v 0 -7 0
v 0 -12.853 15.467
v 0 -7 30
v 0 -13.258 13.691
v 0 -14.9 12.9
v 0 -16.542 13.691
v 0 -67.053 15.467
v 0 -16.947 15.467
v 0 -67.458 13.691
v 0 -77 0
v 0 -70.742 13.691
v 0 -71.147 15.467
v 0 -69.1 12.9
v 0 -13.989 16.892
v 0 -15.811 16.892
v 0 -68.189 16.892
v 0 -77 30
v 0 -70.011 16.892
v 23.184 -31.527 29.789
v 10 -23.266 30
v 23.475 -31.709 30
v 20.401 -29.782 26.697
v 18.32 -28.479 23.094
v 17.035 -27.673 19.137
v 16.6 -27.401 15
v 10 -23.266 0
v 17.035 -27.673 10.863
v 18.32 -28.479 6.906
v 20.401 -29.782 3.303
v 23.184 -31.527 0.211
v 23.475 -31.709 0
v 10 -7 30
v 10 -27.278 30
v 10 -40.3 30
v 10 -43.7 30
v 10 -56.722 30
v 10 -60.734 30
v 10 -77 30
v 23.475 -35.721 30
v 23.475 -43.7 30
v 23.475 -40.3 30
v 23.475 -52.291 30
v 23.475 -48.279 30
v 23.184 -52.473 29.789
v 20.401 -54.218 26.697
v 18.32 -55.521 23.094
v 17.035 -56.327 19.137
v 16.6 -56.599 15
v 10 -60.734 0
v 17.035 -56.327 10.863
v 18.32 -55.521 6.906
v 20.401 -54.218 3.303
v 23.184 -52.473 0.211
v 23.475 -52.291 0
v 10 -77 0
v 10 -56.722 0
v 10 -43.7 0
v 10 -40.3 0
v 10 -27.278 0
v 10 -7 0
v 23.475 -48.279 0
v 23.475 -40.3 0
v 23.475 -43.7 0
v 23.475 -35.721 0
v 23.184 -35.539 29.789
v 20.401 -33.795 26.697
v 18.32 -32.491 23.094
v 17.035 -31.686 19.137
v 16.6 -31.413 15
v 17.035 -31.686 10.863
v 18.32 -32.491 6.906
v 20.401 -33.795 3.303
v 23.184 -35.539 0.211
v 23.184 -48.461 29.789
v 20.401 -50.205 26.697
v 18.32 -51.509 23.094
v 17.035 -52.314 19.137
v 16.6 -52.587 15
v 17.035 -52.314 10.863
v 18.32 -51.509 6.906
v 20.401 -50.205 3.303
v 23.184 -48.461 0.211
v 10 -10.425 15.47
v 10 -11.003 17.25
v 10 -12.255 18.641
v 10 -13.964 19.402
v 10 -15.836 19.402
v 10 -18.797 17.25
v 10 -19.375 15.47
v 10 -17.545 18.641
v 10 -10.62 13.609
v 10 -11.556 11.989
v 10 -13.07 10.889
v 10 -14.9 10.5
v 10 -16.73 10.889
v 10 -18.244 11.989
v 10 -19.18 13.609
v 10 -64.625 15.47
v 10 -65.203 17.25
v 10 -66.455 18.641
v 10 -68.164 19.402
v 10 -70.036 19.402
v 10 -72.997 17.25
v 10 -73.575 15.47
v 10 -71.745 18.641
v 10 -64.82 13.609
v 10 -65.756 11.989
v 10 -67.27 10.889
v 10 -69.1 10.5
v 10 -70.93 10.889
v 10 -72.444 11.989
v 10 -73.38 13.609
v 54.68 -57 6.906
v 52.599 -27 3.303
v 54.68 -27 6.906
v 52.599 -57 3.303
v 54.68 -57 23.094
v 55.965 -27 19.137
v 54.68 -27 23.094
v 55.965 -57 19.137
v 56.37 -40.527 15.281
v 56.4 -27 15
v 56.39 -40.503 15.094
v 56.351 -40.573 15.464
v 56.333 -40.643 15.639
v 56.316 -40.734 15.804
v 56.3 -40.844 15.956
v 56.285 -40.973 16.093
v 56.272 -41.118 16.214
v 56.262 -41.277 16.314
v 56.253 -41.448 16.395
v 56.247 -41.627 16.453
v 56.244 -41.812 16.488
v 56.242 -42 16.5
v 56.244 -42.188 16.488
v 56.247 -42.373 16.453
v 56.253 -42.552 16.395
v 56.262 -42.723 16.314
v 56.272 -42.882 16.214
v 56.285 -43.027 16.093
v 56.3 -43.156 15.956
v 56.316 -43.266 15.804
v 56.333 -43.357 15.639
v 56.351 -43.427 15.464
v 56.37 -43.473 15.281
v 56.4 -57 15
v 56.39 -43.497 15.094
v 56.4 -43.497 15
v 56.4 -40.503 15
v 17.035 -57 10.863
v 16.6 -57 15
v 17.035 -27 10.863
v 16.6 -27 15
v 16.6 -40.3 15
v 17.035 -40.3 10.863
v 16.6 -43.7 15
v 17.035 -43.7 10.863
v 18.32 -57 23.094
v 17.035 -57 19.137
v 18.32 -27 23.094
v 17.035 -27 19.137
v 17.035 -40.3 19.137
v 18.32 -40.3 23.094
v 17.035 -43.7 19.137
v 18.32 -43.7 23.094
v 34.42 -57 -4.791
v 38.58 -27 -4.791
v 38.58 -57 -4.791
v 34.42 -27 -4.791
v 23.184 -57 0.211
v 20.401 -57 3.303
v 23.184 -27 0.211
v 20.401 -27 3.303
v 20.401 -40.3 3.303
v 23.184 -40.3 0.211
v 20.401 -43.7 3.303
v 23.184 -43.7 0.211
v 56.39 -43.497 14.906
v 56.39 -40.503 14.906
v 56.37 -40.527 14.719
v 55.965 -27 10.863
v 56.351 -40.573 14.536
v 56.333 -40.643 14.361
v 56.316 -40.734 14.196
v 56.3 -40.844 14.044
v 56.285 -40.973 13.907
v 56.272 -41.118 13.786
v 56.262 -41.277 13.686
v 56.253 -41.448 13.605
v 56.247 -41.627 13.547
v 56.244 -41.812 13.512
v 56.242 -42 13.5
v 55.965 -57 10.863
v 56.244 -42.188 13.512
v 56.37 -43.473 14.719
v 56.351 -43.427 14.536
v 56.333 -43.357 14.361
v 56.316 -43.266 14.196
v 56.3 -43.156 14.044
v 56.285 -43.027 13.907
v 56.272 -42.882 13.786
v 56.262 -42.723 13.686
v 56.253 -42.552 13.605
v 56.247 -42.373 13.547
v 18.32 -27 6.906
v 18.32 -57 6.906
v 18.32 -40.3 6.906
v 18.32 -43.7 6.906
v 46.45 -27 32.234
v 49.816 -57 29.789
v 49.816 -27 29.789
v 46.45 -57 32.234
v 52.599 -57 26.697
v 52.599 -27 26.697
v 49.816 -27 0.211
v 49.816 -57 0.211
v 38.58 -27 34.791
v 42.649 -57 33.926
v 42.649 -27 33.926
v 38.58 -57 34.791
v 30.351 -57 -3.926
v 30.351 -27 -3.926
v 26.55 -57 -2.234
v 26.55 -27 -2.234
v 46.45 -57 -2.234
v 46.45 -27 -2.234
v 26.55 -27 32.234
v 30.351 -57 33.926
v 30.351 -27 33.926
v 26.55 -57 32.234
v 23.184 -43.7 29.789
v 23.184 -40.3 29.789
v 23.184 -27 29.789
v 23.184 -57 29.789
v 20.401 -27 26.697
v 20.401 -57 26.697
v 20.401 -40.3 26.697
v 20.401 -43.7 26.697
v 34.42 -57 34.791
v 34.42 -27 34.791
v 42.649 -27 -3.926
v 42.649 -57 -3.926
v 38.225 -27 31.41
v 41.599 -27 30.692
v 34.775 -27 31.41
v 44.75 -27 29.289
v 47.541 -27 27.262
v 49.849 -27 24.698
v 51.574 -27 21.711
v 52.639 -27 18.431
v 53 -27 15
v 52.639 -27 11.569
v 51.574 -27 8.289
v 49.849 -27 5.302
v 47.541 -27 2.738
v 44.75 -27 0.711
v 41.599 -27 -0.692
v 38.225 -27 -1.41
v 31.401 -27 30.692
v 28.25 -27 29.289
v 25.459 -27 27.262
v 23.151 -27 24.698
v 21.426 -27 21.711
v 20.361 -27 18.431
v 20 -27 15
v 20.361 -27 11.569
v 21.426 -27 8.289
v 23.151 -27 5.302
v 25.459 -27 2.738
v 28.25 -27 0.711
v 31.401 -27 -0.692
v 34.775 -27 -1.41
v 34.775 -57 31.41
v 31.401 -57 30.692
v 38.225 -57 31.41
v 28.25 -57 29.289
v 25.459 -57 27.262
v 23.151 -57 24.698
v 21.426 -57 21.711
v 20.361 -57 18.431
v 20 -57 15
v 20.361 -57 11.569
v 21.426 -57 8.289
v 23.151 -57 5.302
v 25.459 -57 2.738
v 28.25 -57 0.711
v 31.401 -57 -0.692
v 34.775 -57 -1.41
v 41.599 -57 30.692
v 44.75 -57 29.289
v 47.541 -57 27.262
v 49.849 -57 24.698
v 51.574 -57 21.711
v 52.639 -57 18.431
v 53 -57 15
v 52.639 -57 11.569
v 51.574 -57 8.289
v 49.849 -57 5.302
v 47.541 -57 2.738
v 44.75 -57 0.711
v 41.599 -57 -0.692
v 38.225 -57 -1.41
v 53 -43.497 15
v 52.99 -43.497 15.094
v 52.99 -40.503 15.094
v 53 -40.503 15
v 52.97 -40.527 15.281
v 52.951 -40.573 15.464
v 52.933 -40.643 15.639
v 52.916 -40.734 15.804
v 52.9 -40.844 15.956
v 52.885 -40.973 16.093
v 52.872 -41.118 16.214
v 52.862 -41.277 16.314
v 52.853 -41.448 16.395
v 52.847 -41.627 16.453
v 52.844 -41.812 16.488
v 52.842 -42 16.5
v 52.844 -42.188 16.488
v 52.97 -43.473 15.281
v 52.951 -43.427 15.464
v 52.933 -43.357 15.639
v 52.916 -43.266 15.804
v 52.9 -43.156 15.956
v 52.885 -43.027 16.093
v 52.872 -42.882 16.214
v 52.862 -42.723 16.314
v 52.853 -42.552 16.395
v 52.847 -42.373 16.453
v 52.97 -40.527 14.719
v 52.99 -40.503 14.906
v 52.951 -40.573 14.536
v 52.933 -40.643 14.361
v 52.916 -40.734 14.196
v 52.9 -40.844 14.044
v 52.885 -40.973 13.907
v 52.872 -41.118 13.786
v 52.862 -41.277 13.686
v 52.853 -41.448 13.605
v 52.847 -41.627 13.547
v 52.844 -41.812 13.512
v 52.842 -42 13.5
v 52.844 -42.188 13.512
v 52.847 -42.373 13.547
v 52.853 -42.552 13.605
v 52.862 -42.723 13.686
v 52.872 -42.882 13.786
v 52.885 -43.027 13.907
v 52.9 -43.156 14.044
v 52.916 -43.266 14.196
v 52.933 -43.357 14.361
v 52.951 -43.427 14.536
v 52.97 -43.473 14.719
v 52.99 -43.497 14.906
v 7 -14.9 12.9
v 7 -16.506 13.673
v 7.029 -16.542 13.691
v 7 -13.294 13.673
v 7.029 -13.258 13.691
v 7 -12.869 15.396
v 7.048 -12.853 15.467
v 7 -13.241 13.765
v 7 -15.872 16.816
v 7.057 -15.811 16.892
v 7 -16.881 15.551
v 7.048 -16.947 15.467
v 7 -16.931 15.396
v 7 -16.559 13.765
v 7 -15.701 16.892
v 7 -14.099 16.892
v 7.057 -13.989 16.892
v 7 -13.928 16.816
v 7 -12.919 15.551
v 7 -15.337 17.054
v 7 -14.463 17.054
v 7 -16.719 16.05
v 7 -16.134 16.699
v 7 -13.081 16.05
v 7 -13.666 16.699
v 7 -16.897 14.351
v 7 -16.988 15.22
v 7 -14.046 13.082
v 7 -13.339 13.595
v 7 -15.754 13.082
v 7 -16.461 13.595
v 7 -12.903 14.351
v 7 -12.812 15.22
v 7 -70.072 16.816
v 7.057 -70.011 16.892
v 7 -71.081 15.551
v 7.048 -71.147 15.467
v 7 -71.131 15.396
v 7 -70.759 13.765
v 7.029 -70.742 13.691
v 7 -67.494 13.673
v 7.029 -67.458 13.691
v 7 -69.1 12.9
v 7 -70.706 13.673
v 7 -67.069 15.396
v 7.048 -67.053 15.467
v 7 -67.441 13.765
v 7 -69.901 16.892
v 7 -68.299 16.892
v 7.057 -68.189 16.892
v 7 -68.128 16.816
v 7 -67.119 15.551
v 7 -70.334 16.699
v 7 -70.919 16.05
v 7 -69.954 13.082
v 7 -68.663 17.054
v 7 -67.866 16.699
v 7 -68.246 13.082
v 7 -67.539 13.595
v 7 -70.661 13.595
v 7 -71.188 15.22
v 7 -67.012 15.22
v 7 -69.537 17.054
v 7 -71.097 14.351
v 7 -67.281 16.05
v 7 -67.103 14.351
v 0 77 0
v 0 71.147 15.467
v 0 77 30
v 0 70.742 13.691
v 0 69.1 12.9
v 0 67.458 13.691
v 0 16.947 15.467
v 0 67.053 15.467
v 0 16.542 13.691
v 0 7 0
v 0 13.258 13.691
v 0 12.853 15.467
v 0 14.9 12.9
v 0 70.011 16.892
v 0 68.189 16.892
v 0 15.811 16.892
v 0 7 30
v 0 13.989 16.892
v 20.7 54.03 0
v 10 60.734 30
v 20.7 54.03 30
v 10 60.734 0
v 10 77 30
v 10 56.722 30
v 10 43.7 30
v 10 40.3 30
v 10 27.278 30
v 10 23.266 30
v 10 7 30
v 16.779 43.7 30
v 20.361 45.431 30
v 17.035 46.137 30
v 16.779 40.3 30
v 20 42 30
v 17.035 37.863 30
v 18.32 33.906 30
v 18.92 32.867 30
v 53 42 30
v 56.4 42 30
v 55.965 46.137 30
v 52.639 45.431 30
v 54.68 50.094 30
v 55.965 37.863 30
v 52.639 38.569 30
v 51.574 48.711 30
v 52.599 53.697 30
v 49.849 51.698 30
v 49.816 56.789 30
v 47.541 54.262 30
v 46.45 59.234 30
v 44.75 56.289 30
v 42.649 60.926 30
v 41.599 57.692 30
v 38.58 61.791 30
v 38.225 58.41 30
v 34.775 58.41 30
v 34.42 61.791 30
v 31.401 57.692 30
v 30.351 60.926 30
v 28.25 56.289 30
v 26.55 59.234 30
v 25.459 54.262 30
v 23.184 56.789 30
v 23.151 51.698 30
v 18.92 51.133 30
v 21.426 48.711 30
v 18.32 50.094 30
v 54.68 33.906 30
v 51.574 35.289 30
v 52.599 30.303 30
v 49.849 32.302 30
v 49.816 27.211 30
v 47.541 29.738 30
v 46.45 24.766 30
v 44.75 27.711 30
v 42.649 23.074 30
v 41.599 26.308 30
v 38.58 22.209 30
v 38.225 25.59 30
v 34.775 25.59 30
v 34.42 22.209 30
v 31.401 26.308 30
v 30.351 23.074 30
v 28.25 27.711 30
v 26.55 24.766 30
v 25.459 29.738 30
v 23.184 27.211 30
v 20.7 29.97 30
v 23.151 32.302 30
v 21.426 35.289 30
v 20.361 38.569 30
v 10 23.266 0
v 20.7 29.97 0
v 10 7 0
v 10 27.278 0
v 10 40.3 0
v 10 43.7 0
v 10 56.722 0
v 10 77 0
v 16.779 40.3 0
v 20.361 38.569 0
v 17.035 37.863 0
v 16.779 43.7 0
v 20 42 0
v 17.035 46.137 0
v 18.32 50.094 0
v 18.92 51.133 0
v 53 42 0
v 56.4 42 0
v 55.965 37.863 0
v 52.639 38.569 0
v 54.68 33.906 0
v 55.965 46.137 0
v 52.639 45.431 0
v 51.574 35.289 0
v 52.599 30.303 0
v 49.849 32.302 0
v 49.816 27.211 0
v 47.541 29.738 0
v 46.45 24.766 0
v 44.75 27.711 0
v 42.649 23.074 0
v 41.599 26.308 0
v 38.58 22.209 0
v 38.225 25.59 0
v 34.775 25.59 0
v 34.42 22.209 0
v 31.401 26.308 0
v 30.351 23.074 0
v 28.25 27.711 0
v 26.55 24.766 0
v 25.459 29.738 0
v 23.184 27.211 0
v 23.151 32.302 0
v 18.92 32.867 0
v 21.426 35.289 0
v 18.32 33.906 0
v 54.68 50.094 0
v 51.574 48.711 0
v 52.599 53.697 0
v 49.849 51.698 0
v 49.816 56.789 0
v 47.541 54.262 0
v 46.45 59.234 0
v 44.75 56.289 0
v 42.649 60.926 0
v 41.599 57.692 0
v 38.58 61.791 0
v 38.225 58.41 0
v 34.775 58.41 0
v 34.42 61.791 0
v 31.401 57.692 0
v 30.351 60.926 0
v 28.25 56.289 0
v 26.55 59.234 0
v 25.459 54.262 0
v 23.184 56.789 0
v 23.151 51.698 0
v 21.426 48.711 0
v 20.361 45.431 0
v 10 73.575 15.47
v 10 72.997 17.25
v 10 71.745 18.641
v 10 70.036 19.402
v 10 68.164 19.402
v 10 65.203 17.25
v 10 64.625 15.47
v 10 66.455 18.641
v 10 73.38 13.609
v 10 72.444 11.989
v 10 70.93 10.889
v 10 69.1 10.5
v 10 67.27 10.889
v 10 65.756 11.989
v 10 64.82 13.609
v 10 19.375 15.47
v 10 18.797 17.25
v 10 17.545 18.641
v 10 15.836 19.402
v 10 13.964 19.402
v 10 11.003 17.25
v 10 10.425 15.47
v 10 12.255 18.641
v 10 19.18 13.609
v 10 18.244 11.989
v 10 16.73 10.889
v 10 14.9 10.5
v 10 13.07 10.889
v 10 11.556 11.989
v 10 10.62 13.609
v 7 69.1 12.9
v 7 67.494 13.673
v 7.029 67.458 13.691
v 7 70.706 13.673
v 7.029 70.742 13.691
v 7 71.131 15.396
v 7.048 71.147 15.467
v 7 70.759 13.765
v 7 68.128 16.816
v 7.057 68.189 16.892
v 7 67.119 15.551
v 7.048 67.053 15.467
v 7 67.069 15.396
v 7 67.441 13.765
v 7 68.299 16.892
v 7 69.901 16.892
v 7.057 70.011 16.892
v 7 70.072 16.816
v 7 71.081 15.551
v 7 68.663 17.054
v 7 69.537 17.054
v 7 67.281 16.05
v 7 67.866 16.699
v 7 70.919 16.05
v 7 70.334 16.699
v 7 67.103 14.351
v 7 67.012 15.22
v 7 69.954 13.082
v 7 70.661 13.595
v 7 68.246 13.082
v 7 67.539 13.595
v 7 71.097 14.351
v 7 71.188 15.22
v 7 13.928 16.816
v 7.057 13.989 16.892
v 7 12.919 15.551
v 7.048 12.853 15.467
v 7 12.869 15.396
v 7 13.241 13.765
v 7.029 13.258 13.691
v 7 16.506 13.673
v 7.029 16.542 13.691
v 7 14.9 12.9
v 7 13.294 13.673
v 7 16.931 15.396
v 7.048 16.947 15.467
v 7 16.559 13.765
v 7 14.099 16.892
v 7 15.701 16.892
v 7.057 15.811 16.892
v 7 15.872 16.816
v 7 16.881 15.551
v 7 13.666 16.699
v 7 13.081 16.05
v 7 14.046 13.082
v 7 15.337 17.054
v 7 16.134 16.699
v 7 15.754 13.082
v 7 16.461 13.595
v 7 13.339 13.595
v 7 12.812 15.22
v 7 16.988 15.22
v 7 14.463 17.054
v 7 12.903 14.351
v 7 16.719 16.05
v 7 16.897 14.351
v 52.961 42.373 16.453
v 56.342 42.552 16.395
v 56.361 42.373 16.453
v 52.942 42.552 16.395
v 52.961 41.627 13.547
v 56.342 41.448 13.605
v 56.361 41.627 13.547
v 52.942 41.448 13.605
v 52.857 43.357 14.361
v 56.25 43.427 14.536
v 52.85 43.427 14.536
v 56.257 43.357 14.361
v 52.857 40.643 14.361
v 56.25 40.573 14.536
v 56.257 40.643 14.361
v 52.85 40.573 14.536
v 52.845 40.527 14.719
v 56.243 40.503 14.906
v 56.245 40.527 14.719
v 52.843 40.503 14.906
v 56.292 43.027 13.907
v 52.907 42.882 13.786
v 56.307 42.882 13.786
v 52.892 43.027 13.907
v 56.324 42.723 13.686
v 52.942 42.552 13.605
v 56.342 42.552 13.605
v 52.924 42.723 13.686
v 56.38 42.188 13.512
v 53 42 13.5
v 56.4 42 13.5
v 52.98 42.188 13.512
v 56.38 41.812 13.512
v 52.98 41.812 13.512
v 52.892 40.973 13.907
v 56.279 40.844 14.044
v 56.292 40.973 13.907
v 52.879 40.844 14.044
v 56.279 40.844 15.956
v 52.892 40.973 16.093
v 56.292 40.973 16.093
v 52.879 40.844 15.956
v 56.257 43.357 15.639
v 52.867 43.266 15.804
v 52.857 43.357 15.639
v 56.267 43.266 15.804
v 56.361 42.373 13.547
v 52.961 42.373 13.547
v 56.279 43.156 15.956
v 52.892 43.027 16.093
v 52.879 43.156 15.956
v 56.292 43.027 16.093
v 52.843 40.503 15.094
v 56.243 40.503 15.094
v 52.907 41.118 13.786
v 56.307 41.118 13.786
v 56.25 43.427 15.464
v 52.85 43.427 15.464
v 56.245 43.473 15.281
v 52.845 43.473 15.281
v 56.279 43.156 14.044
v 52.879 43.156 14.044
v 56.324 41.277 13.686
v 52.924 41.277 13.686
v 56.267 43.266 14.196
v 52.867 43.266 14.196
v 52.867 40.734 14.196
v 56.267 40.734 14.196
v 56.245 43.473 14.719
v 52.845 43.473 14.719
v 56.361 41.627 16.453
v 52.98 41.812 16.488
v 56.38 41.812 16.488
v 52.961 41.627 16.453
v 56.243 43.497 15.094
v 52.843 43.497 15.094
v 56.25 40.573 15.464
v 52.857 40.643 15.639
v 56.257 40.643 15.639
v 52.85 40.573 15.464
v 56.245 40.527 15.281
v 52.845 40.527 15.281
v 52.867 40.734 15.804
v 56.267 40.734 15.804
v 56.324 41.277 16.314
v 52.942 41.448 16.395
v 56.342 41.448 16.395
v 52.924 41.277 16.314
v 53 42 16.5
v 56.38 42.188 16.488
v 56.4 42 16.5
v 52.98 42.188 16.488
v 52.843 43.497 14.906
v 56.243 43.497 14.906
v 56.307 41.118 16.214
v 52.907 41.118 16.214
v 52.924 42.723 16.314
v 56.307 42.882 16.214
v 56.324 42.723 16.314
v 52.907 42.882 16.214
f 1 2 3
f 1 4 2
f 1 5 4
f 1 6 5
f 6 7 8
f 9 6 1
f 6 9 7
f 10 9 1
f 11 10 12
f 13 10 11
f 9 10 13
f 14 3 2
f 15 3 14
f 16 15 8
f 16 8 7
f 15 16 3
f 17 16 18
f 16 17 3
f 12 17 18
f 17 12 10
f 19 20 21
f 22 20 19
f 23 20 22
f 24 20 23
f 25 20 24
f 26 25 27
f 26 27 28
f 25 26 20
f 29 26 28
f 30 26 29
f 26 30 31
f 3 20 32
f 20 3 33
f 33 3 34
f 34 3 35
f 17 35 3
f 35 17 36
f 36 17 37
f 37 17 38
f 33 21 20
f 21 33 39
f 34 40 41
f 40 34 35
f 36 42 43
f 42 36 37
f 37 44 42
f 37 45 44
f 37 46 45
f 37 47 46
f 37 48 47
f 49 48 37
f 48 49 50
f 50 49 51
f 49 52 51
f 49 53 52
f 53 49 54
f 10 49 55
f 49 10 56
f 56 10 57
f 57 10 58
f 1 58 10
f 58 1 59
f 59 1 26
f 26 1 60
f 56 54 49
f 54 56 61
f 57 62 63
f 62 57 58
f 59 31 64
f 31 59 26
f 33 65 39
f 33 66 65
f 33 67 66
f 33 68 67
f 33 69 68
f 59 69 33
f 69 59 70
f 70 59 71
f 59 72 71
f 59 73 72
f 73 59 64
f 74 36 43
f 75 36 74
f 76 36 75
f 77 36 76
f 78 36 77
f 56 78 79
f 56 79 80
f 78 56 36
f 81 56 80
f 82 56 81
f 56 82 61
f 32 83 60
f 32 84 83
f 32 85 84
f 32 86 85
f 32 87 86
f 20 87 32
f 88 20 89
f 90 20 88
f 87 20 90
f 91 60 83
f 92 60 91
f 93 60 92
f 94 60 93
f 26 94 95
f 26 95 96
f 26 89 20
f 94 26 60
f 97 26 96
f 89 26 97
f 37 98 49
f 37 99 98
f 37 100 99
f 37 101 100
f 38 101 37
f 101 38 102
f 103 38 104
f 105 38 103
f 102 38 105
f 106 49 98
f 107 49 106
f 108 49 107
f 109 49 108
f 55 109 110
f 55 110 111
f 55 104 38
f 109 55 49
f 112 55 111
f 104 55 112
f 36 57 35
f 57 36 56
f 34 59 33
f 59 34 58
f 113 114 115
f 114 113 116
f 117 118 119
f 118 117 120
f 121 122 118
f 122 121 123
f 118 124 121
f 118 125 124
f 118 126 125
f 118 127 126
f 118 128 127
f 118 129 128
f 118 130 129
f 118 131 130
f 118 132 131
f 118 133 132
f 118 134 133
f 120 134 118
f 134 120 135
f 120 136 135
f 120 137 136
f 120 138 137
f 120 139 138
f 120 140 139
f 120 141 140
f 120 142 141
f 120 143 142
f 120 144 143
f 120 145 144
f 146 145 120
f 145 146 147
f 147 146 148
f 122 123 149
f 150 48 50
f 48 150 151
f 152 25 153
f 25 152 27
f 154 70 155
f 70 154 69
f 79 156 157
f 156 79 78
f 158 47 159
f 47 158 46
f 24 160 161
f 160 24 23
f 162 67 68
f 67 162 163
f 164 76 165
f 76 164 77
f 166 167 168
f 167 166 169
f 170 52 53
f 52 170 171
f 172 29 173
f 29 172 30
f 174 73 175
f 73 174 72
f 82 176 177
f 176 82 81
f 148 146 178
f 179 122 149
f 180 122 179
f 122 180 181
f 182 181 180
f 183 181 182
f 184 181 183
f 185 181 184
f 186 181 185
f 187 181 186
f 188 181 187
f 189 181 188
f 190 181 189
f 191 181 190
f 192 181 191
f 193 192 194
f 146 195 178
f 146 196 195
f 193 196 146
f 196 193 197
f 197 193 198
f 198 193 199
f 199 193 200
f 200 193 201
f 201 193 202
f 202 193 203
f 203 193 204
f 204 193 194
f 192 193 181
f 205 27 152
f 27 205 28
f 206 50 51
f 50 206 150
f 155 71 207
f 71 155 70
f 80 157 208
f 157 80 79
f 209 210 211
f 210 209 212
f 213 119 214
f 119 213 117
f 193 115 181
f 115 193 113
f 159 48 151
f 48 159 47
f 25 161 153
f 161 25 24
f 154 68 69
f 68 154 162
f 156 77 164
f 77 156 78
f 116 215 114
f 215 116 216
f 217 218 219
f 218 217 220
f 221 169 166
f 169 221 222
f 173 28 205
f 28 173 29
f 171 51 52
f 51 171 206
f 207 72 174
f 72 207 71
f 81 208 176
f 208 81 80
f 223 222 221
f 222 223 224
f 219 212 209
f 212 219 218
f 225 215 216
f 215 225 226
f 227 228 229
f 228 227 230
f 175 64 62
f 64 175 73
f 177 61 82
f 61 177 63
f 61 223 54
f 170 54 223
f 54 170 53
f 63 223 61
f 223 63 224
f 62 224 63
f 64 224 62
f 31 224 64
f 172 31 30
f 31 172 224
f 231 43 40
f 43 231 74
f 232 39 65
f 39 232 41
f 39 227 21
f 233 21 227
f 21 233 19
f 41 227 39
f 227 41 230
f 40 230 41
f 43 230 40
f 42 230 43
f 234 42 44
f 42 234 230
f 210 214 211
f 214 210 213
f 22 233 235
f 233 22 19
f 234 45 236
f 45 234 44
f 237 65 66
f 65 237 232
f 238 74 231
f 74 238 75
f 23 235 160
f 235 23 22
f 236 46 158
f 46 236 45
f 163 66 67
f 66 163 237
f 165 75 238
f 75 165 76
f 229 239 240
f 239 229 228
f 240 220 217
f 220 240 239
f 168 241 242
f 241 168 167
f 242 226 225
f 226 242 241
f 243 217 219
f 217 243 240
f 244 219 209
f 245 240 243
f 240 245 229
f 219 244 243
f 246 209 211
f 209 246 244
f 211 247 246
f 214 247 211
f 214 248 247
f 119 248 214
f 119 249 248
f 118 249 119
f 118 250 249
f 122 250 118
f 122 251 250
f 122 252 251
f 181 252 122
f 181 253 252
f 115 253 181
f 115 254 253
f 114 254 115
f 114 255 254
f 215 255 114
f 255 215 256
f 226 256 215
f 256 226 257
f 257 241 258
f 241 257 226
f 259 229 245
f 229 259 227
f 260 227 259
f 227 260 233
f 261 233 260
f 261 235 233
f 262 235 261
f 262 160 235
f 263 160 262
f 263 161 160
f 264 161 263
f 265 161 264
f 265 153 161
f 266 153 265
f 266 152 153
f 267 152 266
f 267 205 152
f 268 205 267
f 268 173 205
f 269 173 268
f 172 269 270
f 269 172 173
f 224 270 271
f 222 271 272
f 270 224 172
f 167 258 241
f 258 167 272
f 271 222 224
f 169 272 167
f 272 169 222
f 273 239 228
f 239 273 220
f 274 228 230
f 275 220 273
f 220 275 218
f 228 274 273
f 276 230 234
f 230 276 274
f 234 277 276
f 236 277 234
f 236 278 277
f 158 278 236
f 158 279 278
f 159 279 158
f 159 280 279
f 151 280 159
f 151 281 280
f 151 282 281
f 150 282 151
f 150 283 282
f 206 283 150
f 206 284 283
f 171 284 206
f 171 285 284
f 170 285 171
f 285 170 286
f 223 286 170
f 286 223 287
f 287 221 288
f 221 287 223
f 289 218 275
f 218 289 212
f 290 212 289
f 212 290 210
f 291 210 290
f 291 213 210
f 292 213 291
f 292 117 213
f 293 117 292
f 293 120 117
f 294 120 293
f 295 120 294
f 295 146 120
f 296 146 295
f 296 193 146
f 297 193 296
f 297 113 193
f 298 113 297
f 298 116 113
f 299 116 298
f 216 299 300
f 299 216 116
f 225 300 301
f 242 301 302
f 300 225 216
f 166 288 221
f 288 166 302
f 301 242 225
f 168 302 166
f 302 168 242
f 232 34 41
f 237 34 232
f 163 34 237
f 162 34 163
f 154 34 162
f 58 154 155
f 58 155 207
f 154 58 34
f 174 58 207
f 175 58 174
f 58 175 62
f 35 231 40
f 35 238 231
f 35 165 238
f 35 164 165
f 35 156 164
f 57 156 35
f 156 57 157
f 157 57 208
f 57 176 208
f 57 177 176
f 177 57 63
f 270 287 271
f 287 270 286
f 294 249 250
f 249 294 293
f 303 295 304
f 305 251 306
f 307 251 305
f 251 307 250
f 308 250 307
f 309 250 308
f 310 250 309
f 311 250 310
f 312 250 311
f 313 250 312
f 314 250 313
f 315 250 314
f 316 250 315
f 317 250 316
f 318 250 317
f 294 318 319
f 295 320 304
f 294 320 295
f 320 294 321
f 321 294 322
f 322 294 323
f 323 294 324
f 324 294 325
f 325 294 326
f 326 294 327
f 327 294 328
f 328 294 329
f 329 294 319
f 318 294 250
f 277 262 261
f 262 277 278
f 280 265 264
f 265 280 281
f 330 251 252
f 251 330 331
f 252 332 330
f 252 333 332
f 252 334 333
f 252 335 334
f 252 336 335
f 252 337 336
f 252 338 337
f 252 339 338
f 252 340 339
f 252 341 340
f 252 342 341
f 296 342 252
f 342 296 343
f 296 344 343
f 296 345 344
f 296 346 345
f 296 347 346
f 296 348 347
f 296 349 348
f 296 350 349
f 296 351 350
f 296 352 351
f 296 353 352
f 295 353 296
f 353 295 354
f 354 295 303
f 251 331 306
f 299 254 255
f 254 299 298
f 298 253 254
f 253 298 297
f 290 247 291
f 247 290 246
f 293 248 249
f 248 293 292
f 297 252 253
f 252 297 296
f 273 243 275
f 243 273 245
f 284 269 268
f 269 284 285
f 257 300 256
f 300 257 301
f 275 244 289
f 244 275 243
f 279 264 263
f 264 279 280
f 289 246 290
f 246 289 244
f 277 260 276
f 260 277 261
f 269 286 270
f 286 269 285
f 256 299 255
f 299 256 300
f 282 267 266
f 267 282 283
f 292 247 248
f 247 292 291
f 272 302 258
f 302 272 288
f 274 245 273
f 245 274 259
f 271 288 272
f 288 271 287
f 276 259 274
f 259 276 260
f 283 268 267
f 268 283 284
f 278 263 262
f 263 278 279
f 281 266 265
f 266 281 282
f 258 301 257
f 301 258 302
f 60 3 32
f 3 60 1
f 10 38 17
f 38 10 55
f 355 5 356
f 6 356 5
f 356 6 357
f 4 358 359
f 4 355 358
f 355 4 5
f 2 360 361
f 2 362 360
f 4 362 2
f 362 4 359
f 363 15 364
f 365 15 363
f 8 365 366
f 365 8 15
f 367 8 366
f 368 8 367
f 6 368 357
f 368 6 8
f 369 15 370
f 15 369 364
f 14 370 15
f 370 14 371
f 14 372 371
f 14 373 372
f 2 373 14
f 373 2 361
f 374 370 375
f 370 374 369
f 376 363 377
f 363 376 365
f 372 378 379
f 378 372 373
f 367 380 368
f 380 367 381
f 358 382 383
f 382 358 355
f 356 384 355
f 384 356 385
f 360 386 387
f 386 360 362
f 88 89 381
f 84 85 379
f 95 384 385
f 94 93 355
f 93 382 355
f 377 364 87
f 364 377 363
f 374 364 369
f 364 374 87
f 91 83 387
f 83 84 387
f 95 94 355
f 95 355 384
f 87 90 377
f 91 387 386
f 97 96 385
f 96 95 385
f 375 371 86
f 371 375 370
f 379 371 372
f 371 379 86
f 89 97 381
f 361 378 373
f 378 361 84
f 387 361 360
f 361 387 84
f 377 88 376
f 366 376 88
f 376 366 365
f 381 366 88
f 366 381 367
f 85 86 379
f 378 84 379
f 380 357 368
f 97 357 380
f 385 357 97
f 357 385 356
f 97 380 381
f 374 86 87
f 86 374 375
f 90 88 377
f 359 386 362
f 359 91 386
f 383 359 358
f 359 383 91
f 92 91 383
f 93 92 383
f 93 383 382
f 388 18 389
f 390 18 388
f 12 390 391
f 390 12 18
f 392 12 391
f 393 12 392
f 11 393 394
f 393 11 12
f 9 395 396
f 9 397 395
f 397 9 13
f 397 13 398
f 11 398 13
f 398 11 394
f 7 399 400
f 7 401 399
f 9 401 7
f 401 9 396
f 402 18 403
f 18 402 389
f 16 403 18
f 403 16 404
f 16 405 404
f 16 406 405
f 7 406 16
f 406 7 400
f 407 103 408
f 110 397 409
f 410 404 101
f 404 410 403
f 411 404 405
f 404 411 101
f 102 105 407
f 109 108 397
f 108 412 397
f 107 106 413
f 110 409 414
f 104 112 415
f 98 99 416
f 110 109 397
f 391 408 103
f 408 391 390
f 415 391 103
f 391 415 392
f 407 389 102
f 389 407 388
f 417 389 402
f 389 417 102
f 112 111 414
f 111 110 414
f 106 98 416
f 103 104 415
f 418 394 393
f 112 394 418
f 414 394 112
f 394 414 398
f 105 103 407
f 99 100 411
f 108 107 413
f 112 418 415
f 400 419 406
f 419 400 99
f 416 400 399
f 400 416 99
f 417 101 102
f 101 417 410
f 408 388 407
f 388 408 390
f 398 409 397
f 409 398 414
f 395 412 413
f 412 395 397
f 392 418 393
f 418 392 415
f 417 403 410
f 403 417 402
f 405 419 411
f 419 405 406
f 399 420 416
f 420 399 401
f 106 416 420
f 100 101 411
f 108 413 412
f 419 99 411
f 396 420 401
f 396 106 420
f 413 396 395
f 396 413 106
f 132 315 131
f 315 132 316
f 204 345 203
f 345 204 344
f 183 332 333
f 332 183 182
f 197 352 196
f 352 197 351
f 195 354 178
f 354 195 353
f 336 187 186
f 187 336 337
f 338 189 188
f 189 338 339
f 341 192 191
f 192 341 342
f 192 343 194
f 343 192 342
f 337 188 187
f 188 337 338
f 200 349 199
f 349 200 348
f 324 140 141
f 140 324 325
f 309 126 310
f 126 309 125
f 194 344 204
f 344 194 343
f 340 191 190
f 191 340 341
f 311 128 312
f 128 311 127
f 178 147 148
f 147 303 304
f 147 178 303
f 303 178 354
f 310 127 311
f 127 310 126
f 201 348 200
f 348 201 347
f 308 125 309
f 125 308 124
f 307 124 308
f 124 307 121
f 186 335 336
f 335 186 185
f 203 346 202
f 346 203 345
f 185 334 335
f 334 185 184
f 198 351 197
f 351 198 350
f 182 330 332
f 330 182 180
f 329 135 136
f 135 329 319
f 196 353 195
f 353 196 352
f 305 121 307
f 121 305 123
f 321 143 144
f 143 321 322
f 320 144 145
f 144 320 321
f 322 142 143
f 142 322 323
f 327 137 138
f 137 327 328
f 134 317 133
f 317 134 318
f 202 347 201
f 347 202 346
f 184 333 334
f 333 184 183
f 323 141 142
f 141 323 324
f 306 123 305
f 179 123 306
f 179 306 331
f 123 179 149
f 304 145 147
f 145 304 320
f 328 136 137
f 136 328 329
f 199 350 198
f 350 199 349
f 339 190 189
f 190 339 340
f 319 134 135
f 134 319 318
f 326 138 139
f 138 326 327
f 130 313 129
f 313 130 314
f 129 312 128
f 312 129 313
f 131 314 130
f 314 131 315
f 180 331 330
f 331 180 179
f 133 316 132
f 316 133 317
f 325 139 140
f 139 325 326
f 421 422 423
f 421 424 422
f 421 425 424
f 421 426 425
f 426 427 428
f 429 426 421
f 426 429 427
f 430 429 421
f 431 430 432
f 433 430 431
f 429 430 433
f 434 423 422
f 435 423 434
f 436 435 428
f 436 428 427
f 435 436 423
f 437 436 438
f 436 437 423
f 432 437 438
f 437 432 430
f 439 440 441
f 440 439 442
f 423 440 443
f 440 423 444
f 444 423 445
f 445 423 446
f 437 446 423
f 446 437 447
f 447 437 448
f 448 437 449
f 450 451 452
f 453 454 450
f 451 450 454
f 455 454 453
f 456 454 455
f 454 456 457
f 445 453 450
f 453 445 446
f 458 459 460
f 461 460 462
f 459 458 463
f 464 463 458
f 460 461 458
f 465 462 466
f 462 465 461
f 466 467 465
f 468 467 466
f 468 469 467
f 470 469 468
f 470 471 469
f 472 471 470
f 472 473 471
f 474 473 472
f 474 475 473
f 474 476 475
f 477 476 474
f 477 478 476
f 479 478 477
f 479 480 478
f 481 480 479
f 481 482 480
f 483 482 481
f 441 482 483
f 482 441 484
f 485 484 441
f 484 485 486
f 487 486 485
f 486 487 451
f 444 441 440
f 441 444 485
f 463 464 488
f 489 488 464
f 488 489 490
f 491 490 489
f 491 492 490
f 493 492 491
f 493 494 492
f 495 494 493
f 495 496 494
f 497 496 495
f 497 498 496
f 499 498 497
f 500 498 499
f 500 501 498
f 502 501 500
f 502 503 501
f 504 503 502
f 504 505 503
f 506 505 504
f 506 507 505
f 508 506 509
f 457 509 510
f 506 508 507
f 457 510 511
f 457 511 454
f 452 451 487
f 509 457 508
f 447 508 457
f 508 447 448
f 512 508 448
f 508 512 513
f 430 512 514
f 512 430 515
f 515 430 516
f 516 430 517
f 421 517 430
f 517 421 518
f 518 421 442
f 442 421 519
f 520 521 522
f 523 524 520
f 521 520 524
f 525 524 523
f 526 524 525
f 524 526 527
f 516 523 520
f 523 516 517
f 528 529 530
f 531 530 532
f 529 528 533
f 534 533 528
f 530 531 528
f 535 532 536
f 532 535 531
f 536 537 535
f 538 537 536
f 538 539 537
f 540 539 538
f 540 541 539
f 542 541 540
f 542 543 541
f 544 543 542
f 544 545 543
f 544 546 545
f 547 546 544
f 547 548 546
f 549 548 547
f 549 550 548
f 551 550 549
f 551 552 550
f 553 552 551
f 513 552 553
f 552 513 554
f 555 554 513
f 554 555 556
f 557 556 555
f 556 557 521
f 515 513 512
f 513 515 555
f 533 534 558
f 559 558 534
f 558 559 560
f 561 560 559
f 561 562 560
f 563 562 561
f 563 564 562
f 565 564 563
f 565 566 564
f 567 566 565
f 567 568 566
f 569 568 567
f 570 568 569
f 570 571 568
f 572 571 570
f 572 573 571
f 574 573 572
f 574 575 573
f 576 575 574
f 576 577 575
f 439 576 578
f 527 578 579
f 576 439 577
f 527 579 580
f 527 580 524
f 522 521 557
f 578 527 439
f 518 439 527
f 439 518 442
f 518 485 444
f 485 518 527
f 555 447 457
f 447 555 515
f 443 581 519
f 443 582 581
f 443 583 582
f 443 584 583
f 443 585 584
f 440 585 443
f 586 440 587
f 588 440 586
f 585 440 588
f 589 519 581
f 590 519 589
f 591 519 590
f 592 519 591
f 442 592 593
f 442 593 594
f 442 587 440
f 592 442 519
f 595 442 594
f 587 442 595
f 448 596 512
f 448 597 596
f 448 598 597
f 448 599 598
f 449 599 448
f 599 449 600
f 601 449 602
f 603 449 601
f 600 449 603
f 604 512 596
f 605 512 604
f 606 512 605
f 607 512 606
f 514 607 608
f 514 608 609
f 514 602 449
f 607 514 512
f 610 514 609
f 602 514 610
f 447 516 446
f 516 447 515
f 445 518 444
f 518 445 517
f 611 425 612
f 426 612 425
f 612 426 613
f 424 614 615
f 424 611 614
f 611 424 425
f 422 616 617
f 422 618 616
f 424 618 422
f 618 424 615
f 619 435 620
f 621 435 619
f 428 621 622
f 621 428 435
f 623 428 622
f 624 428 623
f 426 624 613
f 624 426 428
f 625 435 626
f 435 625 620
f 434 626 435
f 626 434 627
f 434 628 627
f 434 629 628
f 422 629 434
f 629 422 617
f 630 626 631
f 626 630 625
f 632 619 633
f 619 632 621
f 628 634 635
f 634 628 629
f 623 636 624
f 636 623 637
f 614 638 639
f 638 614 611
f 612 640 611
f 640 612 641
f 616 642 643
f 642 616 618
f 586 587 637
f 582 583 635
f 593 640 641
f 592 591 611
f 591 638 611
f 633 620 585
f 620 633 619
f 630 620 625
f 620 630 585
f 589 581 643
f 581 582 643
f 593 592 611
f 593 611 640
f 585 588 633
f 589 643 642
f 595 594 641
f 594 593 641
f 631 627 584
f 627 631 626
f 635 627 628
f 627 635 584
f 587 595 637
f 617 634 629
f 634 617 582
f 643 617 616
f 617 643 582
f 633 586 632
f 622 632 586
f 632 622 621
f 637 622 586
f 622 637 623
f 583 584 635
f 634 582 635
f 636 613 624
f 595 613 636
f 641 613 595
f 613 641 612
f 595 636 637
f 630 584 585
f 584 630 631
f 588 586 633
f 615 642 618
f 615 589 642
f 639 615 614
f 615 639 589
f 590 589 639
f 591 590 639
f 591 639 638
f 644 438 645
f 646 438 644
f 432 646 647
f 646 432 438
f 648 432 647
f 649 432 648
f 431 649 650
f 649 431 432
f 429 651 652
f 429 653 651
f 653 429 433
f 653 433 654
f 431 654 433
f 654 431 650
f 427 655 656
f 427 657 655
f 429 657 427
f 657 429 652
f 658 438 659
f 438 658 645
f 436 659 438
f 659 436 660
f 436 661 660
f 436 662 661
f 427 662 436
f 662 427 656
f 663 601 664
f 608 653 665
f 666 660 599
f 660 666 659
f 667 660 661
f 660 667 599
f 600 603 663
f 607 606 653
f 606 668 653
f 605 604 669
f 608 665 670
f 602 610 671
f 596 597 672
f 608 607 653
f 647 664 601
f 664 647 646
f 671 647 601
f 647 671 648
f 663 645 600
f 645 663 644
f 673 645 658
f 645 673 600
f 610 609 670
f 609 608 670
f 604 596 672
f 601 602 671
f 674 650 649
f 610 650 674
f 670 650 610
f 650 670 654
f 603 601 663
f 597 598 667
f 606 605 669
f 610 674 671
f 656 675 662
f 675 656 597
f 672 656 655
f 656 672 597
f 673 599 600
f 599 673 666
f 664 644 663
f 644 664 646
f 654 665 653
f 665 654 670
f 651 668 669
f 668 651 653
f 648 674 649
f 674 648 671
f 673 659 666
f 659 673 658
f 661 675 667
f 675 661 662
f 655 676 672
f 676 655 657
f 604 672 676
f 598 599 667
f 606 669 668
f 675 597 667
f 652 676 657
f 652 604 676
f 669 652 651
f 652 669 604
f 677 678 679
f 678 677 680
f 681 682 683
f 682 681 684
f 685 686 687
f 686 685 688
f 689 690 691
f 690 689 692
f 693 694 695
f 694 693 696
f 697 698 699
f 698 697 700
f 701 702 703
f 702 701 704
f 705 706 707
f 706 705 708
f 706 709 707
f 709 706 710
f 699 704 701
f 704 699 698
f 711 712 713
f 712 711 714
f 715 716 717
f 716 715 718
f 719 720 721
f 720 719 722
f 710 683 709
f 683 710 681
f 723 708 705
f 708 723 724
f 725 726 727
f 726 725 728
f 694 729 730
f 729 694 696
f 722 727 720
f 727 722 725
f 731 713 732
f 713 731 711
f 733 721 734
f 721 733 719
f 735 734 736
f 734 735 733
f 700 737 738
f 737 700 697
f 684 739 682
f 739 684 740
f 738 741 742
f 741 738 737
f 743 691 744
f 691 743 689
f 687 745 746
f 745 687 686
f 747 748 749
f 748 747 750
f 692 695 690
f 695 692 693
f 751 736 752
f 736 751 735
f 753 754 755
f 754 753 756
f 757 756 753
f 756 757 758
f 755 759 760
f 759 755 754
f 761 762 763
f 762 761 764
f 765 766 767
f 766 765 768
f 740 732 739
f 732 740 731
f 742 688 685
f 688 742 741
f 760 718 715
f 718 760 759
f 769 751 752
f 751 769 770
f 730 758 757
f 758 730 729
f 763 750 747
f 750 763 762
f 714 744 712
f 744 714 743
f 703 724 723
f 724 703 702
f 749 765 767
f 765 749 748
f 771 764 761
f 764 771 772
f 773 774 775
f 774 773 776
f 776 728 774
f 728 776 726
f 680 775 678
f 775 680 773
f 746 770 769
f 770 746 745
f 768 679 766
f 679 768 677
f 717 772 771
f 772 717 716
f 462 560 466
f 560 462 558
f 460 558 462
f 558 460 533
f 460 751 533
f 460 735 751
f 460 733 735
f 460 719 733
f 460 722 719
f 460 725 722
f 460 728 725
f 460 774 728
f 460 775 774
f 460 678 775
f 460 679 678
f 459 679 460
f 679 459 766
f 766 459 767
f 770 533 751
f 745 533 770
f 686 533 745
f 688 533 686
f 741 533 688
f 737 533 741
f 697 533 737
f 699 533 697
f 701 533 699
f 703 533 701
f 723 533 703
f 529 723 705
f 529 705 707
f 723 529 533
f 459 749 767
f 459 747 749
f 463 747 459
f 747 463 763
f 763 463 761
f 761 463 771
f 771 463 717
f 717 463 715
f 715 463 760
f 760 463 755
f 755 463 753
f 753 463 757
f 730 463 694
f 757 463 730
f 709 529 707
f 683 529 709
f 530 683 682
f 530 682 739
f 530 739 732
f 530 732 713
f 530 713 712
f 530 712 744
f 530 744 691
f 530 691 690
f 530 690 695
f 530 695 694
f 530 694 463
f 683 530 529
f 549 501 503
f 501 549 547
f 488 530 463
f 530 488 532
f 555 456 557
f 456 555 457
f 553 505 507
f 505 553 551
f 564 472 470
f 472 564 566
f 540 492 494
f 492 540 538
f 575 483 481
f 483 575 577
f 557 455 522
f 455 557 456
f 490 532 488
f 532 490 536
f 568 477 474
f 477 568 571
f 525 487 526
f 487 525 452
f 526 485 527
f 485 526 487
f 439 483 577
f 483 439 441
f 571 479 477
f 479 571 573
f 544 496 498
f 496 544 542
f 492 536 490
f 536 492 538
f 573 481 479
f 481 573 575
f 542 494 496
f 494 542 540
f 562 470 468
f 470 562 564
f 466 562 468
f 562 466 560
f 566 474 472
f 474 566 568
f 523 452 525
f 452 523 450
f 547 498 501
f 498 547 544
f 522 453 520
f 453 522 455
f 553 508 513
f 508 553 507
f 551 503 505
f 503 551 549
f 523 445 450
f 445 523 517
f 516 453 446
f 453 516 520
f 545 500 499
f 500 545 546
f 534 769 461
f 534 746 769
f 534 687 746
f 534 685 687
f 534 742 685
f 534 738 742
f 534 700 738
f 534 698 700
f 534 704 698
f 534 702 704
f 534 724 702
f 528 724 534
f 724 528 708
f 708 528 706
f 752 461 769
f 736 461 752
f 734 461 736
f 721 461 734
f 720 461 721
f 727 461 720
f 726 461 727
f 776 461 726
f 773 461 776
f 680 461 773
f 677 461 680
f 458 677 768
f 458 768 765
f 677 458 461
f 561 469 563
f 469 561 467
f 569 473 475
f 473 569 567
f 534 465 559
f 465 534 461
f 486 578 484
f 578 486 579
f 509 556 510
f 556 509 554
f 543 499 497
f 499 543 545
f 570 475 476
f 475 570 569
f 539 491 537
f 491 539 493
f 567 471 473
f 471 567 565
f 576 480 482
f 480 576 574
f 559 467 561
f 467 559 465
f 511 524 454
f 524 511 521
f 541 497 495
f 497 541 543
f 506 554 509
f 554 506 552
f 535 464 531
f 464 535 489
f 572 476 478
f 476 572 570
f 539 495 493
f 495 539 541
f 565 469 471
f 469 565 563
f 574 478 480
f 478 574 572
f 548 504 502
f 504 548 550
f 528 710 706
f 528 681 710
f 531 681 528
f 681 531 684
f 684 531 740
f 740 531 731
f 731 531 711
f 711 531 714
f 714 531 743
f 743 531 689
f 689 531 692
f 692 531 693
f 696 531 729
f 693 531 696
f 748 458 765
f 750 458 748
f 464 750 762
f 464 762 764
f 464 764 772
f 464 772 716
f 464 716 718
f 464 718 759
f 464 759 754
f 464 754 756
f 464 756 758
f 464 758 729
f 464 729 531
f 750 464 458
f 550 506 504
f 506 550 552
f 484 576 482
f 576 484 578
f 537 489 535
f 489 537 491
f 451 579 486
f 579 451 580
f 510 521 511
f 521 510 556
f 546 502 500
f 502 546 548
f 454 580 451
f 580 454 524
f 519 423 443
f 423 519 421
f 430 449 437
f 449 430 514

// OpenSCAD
//Use input dimensions
wallThickness = 3.4;
rodDiameter = 33;
ceilingToTop=20;//Hanging distance from ceiling to top of rod
unitHeight = 30;
blockY = 50; //Distance on ceiling between screw mounts
sideTabs=10; //Length of side tabs for screw holes
mountingBlockHeight=10; //Thickness of mounting block
screwHeadDiameter=9;
screwHeadHeight=3;
screwShaft=4.2;
tapScrewDiameter=3;
orientation="both";//Either "parallel", "perpendicular", or "both"


//calculated dimensions
ceilingToCenter=rodDiameter/2+ceilingToTop;//Hanging distance from ceiling to center of rod;
blockD = blockY; //Irrelevant; Resized in code below.
blockR = blockD/2;
blockX = ceilingToCenter+wallThickness; 
baseAngle = atan(blockX/(blockY/2));
topAngle = 180-2*baseAngle;
mountingBlockWidth=blockY+2*sideTabs;


//Make the triangular shape
module triangle1() {
    resize([blockX,blockY,unitHeight])
    translate([blockR*sin(30),0,0])
    cylinder(d=blockD,h=unitHeight,$fn=3);
}
module triangle2() {
    blockY1 = blockY-2*wallThickness/tan(baseAngle/2);
    blockX1 = blockX-wallThickness-wallThickness/sin(topAngle/2);
    translate([wallThickness,0,0])
    resize([blockX1,blockY1,unitHeight])
    translate([blockR*sin(30),0,0])
    cylinder(d=blockD,h=unitHeight,$fn=3);
}

module triangle() {
    difference() {
        triangle1();
        triangle2();
    }
    intersection(){
        translate([0,-blockY/2,0])
        cube([mountingBlockHeight,blockY,unitHeight]);
        triangle1();
    }
}

module mountingBlock() {  
    translate([0,-mountingBlockWidth/2,0])
    cube([mountingBlockHeight,mountingBlockWidth,unitHeight]);
}

module unitPerpendicular() {
    difference(){
        union(){
            translate([ceilingToCenter,0,0])
            cylinder(d=rodDiameter+2*wallThickness,h=unitHeight);
            triangle();
            translate([0,-wallThickness/2,0])
            cube([blockX-wallThickness,wallThickness,unitHeight]);
        }
        translate([ceilingToCenter,0,0])
        cylinder(d=rodDiameter,h=unitHeight);
    }
    mountingBlock();
}

//Make screw holes
module finalUnitPerpendicular() {
    difference(){
        unitPerpendicular();
        union(){
            translate([0,mountingBlockWidth/2-screwHeadDiameter/2-wallThickness,unitHeight/2])
            rotate([0,90,0])
            cylinder(d=screwShaft,h=mountingBlockHeight);
            translate([mountingBlockHeight-screwHeadHeight,mountingBlockWidth/2-screwHeadDiameter/2-wallThickness,unitHeight/2])
            rotate([0,90,0])
            cylinder(d1=screwShaft,d2=screwHeadDiameter,h=screwHeadHeight);
            translate([0,-mountingBlockWidth/2+screwHeadDiameter/2+wallThickness,unitHeight/2])
            rotate([0,90,0])
            cylinder(d=screwShaft,h=mountingBlockHeight);
            translate([mountingBlockHeight-screwHeadHeight,-mountingBlockWidth/2+screwHeadDiameter/2+wallThickness,unitHeight/2])
            rotate([0,90,0])
            cylinder(d1=screwShaft,d2=screwHeadDiameter,h=screwHeadHeight);
            translate([ceilingToCenter+rodDiameter/2-wallThickness,0,unitHeight/2])
            rotate([0,90,0])
            cylinder(d=tapScrewDiameter,h=wallThickness*2,$fn=50);
        }
    }
}

module unitParallel() {
    difference(){
        union(){
            translate([ceilingToCenter,unitHeight/2,unitHeight/2])
            rotate([90,0,0])
            cylinder(d=rodDiameter+2*wallThickness,h=unitHeight);
            triangle();
            translate([0,-wallThickness/2,0])
            cube([blockX-wallThickness,wallThickness,unitHeight]);
        }
        translate([ceilingToCenter,mountingBlockWidth/2,unitHeight/2])
        rotate([90,0,0])
        cylinder(d=rodDiameter,h=mountingBlockWidth);
    }
    mountingBlock();
}

//Make screw holes
module finalUnitParallel() {
difference(){
        unitParallel();
        union(){
            translate([0,mountingBlockWidth/2-screwHeadDiameter/2-wallThickness,unitHeight/2])
            rotate([0,90,0])
            cylinder(d=screwShaft,h=mountingBlockHeight);
            translate([mountingBlockHeight-screwHeadHeight,mountingBlockWidth/2-screwHeadDiameter/2-wallThickness,unitHeight/2])
            rotate([0,90,0])
            cylinder(d1=screwShaft,d2=screwHeadDiameter,h=screwHeadHeight);
            translate([0,-mountingBlockWidth/2+screwHeadDiameter/2+wallThickness,unitHeight/2])
            rotate([0,90,0])
            cylinder(d=screwShaft,h=mountingBlockHeight);
            translate([mountingBlockHeight-screwHeadHeight,-mountingBlockWidth/2+screwHeadDiameter/2+wallThickness,unitHeight/2])
            rotate([0,90,0])
            cylinder(d1=screwShaft,d2=screwHeadDiameter,h=screwHeadHeight);
            translate([ceilingToCenter+rodDiameter/2-wallThickness,0,unitHeight/2])
            rotate([0,90,0])
            cylinder(d=tapScrewDiameter,h=wallThickness*2,$fn=50);
        }
    }
}

if(orientation=="parallel") {
    finalUnitParallel();
}
if(orientation=="perpendicular") {
    finalUnitPerpendicular();
}
if(orientation=="both") {
    translate([0,-mountingBlockWidth*1.2/2,0])
    finalUnitParallel();
    translate([0,mountingBlockWidth*1.2/2,0])
    finalUnitPerpendicular();
}
